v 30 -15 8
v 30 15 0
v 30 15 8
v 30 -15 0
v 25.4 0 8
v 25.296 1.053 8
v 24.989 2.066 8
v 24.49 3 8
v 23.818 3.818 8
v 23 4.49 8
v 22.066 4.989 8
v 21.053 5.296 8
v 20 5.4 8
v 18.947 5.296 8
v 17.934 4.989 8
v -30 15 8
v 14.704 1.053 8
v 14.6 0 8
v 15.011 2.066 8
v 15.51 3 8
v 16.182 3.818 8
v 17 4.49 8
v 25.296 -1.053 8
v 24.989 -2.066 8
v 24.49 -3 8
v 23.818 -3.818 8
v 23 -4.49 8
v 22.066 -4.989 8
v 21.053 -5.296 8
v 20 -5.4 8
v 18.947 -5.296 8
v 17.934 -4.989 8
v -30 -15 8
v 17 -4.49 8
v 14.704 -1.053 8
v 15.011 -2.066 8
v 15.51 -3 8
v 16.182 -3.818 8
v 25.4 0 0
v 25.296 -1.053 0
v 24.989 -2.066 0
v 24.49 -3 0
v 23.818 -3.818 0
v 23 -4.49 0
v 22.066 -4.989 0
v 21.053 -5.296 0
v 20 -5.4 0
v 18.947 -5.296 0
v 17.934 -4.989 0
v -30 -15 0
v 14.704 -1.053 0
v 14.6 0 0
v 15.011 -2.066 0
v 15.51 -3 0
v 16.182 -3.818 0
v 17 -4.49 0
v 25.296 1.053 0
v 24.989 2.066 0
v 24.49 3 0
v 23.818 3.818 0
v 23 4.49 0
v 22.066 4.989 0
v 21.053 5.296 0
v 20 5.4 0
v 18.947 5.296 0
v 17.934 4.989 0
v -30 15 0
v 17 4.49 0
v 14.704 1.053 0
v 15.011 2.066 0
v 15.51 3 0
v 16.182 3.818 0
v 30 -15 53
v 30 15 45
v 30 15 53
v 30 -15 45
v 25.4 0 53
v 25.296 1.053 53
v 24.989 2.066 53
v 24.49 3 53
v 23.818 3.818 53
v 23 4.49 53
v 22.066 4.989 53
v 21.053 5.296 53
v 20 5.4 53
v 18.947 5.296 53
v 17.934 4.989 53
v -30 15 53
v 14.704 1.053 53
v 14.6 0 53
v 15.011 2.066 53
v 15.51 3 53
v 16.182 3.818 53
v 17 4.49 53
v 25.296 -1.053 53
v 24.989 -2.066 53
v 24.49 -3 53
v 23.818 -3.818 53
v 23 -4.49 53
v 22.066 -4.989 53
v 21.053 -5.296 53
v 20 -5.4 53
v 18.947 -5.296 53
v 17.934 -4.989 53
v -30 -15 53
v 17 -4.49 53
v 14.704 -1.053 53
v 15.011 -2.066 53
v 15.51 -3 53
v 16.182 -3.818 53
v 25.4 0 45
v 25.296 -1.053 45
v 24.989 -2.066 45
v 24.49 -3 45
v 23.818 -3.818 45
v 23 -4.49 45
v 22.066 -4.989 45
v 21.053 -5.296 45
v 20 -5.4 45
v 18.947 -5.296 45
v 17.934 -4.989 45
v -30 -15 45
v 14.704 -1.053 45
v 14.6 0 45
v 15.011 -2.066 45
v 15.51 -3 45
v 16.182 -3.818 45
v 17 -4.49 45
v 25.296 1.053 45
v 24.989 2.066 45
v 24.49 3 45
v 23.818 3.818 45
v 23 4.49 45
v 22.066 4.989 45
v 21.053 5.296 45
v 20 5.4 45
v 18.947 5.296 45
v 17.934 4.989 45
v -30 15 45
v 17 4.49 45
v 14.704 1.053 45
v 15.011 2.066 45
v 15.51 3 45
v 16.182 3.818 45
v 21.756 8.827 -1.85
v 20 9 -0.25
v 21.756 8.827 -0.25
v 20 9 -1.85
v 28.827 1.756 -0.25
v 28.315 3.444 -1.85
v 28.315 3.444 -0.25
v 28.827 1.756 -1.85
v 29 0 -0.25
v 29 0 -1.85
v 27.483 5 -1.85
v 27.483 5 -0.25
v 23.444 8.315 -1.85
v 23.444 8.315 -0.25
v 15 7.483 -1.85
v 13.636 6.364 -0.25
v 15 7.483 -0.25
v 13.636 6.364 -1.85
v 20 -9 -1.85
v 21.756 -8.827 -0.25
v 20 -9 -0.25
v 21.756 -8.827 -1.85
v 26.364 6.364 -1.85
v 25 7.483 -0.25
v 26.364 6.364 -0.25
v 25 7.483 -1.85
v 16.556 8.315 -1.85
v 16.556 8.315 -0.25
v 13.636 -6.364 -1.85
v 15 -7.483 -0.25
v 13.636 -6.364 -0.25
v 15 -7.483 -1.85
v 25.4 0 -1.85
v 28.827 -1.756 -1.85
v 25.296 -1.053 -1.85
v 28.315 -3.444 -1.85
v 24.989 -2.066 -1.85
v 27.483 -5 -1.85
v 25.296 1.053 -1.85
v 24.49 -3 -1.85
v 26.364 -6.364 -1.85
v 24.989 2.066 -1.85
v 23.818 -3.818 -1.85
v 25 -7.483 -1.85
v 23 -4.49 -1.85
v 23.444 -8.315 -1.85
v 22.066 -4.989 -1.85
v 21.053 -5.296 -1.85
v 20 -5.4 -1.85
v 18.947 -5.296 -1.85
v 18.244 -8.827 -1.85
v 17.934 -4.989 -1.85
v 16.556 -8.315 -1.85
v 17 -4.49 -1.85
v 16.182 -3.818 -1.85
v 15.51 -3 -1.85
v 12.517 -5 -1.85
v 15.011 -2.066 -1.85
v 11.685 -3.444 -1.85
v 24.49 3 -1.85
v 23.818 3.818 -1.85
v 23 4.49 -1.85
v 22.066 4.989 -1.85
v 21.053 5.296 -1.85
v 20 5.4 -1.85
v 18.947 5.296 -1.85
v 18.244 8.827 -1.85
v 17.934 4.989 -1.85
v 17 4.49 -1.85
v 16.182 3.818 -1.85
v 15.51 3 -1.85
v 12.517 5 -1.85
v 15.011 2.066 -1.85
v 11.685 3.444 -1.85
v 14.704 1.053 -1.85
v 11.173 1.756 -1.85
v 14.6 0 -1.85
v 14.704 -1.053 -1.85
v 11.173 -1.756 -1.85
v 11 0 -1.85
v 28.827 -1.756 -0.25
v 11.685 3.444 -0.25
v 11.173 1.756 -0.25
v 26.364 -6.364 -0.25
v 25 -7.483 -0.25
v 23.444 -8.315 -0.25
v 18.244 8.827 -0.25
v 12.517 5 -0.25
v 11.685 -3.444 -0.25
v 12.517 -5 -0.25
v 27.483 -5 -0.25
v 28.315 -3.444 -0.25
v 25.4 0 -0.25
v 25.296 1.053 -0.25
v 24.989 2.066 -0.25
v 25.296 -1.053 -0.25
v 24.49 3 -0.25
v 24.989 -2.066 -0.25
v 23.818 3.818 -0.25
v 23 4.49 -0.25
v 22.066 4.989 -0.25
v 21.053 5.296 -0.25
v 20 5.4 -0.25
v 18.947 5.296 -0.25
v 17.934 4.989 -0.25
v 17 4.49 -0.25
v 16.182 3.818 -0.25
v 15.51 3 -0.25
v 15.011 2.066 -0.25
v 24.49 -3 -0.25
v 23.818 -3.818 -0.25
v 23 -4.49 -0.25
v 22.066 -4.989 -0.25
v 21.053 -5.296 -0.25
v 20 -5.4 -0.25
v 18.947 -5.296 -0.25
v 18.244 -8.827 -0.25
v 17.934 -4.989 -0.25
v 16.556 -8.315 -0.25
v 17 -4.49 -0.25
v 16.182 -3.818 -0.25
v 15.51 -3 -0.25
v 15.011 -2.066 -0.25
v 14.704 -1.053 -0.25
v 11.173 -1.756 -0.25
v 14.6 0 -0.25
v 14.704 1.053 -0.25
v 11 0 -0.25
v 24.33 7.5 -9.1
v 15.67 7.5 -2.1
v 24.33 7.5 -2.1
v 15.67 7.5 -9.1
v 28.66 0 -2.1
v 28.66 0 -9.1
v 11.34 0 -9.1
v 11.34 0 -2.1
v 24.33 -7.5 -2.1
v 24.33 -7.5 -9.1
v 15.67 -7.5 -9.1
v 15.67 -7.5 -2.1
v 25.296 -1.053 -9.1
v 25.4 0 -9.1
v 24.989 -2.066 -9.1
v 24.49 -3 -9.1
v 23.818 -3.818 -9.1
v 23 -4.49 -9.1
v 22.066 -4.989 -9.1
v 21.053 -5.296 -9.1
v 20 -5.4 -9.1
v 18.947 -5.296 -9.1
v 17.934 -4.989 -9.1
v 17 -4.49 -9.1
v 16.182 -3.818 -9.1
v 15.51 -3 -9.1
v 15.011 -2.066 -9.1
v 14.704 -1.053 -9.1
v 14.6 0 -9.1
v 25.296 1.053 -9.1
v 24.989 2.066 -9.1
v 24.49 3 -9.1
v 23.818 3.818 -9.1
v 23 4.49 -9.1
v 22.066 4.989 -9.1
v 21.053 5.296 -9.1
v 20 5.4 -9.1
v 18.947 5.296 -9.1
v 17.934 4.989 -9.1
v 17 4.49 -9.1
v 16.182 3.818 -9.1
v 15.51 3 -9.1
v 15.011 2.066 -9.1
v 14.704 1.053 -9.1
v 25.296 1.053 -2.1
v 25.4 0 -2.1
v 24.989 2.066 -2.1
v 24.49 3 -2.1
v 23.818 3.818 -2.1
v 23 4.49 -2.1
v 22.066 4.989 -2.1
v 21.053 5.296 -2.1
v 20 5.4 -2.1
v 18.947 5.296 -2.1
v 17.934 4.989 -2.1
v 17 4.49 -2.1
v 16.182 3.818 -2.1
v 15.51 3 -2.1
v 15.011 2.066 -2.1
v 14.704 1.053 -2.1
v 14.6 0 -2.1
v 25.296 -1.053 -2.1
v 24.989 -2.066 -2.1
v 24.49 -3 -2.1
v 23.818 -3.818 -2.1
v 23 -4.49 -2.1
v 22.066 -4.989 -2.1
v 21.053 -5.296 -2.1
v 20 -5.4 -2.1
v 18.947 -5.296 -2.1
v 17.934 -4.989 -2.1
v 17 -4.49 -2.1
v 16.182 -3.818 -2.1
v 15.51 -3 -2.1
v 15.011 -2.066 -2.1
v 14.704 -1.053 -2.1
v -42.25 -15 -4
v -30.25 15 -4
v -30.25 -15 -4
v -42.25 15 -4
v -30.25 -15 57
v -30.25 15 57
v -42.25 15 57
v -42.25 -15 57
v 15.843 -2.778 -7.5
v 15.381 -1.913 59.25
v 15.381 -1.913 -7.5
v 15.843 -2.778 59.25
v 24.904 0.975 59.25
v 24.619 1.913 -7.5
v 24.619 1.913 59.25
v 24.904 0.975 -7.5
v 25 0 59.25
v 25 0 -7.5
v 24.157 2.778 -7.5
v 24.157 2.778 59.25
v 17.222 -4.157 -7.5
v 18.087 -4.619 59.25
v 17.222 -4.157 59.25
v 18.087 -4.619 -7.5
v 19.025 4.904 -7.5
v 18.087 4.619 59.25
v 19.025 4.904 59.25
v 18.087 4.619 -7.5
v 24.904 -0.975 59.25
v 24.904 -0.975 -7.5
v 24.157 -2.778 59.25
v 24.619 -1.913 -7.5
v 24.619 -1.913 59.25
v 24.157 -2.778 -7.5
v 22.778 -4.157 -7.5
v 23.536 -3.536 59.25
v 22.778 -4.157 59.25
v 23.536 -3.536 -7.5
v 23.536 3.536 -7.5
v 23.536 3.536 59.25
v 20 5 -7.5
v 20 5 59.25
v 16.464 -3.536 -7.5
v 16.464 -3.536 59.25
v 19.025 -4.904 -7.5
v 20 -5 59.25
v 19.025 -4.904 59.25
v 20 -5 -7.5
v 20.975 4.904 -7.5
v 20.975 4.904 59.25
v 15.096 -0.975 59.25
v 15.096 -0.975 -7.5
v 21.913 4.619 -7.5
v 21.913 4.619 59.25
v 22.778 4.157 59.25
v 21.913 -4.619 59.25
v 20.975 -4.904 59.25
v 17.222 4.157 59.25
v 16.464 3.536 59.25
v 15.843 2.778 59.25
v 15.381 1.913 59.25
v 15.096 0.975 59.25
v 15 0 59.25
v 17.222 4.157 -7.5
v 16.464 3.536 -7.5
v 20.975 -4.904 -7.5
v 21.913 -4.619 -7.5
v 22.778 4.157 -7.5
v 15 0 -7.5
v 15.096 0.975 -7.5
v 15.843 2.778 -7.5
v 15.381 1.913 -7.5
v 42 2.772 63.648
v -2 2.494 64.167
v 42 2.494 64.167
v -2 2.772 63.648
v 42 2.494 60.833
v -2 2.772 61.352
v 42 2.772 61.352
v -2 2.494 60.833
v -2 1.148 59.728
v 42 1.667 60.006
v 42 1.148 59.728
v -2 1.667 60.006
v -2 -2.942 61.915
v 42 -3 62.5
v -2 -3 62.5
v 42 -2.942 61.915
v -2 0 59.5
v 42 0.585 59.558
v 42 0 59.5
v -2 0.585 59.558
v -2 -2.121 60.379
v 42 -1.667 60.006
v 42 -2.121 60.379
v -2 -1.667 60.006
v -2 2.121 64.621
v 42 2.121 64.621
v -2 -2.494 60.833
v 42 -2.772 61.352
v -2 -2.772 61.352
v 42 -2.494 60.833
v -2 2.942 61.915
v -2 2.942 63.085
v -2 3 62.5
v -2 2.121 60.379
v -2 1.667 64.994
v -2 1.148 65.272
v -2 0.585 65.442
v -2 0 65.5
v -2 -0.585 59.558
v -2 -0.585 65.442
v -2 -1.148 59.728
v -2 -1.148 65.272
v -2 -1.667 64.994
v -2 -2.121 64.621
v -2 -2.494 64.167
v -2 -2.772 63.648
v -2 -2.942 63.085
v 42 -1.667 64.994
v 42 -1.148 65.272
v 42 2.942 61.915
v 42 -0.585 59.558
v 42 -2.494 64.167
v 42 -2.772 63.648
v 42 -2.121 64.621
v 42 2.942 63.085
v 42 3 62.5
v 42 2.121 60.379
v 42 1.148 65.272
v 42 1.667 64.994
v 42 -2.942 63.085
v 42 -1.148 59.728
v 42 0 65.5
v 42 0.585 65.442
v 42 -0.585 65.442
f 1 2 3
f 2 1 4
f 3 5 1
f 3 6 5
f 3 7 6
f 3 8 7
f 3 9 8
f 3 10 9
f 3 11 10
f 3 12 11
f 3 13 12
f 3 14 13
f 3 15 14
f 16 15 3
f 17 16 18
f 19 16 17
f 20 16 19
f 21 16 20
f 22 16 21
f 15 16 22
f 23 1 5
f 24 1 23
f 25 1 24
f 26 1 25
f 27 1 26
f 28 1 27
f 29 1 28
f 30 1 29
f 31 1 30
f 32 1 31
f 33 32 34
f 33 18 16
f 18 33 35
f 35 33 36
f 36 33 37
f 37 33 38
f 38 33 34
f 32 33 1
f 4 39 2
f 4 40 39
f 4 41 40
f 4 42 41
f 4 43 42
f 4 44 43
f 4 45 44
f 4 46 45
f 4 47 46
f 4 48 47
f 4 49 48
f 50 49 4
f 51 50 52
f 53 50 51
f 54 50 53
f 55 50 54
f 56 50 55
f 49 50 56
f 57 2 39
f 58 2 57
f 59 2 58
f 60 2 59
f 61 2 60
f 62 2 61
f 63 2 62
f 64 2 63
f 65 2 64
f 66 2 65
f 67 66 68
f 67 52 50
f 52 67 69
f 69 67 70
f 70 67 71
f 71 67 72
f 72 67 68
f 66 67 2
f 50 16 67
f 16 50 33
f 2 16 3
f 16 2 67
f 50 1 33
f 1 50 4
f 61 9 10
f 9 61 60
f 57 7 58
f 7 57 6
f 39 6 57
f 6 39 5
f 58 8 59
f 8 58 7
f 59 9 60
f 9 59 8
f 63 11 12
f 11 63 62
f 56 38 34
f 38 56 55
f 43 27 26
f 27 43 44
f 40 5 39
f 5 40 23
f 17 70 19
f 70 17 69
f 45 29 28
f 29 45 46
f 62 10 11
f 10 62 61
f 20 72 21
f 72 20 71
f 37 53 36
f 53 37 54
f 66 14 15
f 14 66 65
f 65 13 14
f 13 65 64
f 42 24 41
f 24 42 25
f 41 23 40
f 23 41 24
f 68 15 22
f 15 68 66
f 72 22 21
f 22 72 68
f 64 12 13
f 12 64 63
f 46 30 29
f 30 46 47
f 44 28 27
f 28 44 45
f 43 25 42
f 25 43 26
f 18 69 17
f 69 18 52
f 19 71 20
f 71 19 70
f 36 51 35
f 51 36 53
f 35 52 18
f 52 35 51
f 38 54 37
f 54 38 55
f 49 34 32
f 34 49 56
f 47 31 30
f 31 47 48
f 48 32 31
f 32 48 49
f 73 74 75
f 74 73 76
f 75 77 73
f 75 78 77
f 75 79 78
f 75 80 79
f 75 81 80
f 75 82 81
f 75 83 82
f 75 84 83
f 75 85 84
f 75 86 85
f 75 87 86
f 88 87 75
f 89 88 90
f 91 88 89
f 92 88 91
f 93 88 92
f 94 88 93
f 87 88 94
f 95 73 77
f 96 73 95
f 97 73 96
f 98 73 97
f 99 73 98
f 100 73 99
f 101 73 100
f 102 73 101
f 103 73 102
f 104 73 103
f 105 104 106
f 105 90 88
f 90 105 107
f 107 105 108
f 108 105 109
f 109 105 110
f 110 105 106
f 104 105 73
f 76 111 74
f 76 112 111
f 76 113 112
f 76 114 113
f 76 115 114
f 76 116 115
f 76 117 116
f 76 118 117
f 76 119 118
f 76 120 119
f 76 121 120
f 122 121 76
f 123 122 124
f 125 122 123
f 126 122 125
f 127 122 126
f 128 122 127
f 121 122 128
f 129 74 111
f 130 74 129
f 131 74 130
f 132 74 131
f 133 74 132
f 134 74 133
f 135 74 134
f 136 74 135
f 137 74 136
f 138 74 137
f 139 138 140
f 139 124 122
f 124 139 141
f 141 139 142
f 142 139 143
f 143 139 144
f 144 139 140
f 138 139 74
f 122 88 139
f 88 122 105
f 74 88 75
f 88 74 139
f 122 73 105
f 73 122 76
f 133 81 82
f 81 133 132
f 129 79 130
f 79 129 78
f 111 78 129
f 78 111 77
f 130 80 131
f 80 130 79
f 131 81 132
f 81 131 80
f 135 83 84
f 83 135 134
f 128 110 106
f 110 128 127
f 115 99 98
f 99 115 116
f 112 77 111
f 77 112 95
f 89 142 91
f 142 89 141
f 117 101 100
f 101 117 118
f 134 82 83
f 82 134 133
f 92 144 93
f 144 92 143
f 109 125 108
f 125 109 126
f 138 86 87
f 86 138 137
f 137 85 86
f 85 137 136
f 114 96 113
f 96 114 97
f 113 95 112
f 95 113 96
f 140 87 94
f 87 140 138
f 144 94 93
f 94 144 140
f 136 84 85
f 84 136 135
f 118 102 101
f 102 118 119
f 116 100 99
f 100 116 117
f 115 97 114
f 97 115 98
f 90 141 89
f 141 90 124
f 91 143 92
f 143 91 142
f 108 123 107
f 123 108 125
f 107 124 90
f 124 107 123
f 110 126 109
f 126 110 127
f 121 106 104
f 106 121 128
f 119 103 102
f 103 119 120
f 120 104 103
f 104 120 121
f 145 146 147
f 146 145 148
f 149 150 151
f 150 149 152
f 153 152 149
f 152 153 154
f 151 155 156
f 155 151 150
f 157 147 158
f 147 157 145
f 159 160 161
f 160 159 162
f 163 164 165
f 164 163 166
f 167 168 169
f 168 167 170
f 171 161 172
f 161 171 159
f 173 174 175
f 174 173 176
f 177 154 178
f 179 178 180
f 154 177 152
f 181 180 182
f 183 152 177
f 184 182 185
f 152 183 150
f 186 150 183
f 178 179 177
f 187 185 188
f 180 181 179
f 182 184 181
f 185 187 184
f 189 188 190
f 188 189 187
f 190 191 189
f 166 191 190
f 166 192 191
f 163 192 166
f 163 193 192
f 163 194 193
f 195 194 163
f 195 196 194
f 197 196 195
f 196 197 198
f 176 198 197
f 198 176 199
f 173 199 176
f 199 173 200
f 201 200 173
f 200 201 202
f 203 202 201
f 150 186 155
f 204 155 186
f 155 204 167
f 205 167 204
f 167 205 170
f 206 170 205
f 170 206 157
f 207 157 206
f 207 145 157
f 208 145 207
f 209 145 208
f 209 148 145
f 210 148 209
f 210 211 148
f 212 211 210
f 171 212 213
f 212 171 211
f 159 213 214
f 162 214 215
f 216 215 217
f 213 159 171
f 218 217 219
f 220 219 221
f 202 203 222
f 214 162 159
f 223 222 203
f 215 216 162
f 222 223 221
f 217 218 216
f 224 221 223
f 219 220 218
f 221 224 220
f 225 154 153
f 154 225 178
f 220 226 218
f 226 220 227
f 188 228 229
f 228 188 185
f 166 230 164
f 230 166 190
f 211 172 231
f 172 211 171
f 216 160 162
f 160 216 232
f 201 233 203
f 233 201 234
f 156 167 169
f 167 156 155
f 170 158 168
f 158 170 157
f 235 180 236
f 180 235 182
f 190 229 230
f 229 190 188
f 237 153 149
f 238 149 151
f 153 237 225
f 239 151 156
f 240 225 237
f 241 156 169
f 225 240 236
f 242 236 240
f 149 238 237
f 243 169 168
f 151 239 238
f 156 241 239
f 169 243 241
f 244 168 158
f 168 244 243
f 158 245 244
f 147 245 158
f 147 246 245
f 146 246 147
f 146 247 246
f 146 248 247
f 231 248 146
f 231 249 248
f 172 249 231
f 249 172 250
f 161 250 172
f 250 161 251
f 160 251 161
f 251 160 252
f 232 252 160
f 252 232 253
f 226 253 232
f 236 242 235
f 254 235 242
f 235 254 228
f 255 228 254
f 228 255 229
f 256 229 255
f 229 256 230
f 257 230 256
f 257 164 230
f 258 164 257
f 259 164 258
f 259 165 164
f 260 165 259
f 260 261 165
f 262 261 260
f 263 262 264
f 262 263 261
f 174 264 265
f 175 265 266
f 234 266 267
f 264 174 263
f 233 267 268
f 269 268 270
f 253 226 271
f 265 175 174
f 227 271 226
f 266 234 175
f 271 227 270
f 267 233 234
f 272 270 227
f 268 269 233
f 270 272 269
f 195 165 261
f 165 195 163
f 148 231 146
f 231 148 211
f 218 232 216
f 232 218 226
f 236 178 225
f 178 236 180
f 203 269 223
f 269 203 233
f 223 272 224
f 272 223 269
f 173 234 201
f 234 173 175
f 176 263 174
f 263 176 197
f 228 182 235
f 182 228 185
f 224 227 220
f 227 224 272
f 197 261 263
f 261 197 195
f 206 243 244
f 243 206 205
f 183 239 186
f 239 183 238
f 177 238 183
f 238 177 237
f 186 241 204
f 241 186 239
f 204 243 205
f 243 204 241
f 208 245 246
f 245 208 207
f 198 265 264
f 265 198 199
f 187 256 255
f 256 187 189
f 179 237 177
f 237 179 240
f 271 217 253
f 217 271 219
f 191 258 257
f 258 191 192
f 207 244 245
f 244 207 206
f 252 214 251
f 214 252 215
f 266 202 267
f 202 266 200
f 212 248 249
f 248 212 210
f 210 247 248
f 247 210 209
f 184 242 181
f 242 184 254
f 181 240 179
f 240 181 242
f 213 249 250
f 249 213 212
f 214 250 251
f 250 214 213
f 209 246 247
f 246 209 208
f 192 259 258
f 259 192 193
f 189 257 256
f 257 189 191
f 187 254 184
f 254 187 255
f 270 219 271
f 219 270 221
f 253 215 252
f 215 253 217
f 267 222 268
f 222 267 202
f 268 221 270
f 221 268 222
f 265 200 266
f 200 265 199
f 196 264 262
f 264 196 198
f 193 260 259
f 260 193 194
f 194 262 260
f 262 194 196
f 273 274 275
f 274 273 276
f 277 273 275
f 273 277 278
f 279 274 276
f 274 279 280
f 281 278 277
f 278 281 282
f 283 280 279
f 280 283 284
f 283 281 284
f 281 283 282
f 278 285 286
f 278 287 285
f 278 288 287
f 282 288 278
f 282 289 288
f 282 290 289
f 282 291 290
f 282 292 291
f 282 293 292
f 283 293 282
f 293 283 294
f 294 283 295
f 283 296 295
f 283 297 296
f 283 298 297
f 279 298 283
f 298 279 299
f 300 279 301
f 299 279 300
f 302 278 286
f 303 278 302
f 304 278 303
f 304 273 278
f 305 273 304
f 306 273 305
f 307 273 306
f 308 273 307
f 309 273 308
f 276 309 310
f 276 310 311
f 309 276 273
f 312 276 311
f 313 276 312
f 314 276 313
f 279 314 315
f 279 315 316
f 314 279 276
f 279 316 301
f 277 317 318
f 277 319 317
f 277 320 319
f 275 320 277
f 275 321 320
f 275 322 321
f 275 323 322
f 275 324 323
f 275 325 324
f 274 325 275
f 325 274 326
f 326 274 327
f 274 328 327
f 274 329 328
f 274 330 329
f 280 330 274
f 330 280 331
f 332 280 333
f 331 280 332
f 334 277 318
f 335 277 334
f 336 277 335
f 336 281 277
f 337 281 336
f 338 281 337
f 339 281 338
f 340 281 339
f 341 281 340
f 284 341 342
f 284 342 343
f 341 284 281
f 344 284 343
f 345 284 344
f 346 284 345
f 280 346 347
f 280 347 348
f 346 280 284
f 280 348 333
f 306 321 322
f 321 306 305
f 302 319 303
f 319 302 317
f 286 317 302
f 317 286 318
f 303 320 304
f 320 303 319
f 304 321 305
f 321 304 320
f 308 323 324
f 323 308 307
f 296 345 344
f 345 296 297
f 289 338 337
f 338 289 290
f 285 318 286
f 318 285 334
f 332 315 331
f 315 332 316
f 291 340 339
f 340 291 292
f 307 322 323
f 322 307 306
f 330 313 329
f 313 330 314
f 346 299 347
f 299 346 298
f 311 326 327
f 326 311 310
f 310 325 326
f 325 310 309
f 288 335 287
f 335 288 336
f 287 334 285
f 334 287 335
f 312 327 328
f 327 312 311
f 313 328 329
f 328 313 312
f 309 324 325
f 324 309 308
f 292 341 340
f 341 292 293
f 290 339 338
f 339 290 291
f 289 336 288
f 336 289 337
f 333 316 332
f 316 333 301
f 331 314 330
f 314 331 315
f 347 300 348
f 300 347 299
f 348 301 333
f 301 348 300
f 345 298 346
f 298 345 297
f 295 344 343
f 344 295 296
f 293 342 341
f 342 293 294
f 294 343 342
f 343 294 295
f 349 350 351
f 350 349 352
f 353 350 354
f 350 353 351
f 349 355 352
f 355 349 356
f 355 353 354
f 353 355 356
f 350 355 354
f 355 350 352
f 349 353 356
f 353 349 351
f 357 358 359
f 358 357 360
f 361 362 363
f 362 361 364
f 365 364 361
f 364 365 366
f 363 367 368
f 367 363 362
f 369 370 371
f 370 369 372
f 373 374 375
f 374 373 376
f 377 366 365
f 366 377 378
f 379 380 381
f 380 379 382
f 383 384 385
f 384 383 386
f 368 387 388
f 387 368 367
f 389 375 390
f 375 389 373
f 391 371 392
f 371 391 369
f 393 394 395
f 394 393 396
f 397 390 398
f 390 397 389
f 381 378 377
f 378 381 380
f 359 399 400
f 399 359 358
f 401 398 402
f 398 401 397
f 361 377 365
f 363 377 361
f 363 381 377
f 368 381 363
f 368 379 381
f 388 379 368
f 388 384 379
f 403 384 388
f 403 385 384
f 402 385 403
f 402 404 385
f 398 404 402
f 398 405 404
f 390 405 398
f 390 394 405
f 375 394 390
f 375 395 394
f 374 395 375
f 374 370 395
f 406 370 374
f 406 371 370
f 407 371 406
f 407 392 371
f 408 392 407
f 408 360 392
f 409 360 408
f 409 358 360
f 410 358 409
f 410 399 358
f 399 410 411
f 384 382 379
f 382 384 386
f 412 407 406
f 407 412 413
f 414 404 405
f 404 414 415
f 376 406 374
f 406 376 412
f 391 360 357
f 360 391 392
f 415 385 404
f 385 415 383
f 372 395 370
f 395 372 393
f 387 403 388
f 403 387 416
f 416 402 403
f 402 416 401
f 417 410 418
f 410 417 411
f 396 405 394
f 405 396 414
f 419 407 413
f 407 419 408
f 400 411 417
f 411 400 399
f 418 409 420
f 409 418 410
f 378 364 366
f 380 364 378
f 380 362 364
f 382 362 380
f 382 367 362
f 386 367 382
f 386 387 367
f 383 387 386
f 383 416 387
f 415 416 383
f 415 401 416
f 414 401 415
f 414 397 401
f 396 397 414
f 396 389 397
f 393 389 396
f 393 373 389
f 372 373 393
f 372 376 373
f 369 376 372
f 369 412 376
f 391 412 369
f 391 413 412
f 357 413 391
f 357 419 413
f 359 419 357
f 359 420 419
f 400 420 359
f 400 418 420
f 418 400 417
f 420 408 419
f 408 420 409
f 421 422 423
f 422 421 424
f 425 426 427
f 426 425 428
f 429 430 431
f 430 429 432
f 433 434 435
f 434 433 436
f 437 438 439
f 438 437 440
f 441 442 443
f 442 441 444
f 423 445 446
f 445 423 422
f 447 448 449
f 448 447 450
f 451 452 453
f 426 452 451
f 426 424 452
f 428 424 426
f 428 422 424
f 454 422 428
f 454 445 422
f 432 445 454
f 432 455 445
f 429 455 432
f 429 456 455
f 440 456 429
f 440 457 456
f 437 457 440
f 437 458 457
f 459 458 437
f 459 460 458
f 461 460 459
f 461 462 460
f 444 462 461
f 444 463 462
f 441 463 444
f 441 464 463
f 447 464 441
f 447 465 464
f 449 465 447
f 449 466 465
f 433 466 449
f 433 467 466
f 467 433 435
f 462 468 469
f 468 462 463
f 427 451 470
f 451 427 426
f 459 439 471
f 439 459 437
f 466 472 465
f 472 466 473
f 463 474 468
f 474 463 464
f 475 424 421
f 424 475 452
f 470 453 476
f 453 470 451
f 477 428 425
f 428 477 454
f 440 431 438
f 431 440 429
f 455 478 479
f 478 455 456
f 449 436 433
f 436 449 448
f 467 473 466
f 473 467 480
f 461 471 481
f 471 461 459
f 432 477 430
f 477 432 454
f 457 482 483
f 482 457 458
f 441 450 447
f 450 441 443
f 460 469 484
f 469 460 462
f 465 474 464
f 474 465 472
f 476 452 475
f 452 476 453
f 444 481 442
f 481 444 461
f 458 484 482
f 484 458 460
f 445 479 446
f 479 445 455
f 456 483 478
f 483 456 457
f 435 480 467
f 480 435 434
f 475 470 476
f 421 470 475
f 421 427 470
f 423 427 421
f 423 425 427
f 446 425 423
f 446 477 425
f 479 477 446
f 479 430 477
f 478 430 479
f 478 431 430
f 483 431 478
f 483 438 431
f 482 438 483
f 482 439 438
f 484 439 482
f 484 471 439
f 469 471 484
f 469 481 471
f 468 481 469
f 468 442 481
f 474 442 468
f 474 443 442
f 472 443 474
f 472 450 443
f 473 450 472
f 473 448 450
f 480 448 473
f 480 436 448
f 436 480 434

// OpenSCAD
$fn = 32;

// ------------------------------------------------------------------------
// C clamp: throat 45 mm, screw d10
// Every part is its own module, assembly() places every instance.
// ------------------------------------------------------------------------

// --- part 1 ---
module clamp_arm() {
  difference() {
    translate([-30, -15, 0]) cube([60, 30, 8]);
    translate([20, 0, -1]) cylinder(h = 10, d = 10.8);
  }
}

// --- part 2 ---
module clamp_spine() {
  difference() {
    translate([-30.5, -15, 0]) cube([61, 30, 12]);
  }
}

// --- part 3 ---
module clamp_screw() {
  translate([0, 0, -33.375]) cylinder(h = 66.75, d = 10);
}

// --- part 4 ---
module clamp_washer() {
  difference() {
      translate([0, 0, 0]) cylinder(h = 1.6, d = 18);
      translate([0, 0, -1]) cylinder(h = 3.6, d = 10.8);
    }
}

// --- part 5 ---
module clamp_nut() {
  difference() {
    linear_extrude(height = 7) polygon(points = [[8.66, 0], [4.33, 7.5], [-4.33, 7.5], [-8.66, 0], [-4.33, -7.5], [4.33, -7.5]]);
    translate([0, 0, -1]) cylinder(h = 9, d = 10.8);
  }
}

// --- part 6 ---
module tommy_bar() {
  translate([0, 0, -22]) cylinder(h = 44, d = 6);
}

// --- assembly ---
module assembly() {
  color([0.80, 0.24, 0.20]) translate([0, 0, 0]) rotate([0, 0, 0]) clamp_arm();
  color([0.20, 0.45, 0.75]) translate([0, 0, 45]) rotate([0, 0, 0]) clamp_arm();
  color([0.25, 0.62, 0.32]) translate([-42.25, 0, 26.5]) rotate([0, 90, 0]) clamp_spine();
  color([0.92, 0.70, 0.18]) translate([20, 0, 25.875]) rotate([0, 0, 0]) clamp_screw();
  color([0.58, 0.35, 0.70]) translate([20, 0, -1.85]) rotate([0, 0, 0]) clamp_washer();
  color([0.16, 0.66, 0.66]) translate([20, 0, -9.1]) rotate([0, 0, 0]) clamp_nut();
  color([0.85, 0.48, 0.18]) translate([20, 0, 62.5]) rotate([0, 90, 0]) tommy_bar();
}

assembly();
